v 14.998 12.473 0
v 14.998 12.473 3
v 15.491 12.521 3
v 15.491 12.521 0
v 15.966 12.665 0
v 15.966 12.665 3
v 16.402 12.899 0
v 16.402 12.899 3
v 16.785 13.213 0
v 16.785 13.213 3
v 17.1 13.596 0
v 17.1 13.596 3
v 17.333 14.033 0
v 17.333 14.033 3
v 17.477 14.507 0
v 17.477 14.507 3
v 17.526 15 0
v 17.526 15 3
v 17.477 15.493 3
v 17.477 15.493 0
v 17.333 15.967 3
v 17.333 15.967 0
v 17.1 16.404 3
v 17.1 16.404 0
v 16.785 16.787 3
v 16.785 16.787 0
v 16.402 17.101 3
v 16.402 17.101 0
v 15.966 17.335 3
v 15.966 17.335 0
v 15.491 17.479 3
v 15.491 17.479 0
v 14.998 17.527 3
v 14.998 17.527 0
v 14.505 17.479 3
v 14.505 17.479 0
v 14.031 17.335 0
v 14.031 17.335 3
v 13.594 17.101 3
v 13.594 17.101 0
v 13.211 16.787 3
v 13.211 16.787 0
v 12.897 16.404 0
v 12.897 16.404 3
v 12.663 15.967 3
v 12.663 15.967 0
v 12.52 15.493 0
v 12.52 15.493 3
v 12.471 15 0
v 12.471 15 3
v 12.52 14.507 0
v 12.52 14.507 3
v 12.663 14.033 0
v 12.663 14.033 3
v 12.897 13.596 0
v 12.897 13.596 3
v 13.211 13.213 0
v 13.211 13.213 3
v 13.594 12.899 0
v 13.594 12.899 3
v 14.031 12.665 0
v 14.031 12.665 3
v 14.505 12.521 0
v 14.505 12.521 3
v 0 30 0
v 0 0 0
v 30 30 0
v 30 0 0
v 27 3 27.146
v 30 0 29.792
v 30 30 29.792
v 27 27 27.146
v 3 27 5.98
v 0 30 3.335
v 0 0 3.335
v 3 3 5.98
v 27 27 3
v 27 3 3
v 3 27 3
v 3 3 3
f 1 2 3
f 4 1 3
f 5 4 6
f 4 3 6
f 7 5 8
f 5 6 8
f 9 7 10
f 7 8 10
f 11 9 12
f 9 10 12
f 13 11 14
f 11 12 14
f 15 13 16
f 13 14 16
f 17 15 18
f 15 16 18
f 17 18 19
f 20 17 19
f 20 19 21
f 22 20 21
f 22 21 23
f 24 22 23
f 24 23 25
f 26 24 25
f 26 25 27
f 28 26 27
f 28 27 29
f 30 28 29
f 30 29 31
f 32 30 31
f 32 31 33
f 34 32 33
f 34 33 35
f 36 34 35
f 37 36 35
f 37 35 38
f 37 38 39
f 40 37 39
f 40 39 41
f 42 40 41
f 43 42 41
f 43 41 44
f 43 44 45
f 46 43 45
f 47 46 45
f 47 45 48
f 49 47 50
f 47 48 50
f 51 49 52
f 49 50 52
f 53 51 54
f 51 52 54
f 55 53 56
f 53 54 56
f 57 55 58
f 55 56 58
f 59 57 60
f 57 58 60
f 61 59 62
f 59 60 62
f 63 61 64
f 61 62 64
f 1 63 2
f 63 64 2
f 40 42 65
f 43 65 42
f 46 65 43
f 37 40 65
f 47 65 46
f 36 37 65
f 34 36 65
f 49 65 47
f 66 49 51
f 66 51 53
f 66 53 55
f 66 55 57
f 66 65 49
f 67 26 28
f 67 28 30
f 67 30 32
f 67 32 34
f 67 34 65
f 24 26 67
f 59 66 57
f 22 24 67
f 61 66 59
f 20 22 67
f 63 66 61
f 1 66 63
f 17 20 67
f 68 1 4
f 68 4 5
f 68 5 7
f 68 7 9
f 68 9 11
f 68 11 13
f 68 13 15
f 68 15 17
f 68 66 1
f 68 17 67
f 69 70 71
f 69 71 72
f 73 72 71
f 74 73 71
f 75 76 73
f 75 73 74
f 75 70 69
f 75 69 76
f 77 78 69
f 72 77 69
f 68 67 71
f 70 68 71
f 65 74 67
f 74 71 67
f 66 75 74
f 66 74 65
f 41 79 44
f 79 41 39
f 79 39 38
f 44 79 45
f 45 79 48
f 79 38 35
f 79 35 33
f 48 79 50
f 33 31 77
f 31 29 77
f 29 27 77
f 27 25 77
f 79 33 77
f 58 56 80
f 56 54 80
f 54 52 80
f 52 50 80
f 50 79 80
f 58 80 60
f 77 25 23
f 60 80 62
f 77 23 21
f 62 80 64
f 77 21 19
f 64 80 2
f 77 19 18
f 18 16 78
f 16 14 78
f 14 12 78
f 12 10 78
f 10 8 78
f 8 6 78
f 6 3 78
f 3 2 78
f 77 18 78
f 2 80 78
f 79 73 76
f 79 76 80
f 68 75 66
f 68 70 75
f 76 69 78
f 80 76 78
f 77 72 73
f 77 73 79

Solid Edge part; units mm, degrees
sketch "Sketch1" plane through (0, 0, 0) normal (0, -1, 0) x (1, 0, 0)
  line L0 (30, 0) -> (30, 29.7921)
  line L1 (30, 29.7921) -> (0, 3.3346)
  line L2 (0, 3.3346) -> (0, 0)
  line L3 (0, 0) -> (30, 0)
extrude "Protrusion1" add sketch "Sketch1" against normal blind 30
shell "Thinwall_1" thickness 3 removed faces 1 at (25.3, 24.7, 25.6471)
hole "Hole_1" at (14.9984, 15, 3) direction (0, 0, -1) diameter 5.0546 end up to next
